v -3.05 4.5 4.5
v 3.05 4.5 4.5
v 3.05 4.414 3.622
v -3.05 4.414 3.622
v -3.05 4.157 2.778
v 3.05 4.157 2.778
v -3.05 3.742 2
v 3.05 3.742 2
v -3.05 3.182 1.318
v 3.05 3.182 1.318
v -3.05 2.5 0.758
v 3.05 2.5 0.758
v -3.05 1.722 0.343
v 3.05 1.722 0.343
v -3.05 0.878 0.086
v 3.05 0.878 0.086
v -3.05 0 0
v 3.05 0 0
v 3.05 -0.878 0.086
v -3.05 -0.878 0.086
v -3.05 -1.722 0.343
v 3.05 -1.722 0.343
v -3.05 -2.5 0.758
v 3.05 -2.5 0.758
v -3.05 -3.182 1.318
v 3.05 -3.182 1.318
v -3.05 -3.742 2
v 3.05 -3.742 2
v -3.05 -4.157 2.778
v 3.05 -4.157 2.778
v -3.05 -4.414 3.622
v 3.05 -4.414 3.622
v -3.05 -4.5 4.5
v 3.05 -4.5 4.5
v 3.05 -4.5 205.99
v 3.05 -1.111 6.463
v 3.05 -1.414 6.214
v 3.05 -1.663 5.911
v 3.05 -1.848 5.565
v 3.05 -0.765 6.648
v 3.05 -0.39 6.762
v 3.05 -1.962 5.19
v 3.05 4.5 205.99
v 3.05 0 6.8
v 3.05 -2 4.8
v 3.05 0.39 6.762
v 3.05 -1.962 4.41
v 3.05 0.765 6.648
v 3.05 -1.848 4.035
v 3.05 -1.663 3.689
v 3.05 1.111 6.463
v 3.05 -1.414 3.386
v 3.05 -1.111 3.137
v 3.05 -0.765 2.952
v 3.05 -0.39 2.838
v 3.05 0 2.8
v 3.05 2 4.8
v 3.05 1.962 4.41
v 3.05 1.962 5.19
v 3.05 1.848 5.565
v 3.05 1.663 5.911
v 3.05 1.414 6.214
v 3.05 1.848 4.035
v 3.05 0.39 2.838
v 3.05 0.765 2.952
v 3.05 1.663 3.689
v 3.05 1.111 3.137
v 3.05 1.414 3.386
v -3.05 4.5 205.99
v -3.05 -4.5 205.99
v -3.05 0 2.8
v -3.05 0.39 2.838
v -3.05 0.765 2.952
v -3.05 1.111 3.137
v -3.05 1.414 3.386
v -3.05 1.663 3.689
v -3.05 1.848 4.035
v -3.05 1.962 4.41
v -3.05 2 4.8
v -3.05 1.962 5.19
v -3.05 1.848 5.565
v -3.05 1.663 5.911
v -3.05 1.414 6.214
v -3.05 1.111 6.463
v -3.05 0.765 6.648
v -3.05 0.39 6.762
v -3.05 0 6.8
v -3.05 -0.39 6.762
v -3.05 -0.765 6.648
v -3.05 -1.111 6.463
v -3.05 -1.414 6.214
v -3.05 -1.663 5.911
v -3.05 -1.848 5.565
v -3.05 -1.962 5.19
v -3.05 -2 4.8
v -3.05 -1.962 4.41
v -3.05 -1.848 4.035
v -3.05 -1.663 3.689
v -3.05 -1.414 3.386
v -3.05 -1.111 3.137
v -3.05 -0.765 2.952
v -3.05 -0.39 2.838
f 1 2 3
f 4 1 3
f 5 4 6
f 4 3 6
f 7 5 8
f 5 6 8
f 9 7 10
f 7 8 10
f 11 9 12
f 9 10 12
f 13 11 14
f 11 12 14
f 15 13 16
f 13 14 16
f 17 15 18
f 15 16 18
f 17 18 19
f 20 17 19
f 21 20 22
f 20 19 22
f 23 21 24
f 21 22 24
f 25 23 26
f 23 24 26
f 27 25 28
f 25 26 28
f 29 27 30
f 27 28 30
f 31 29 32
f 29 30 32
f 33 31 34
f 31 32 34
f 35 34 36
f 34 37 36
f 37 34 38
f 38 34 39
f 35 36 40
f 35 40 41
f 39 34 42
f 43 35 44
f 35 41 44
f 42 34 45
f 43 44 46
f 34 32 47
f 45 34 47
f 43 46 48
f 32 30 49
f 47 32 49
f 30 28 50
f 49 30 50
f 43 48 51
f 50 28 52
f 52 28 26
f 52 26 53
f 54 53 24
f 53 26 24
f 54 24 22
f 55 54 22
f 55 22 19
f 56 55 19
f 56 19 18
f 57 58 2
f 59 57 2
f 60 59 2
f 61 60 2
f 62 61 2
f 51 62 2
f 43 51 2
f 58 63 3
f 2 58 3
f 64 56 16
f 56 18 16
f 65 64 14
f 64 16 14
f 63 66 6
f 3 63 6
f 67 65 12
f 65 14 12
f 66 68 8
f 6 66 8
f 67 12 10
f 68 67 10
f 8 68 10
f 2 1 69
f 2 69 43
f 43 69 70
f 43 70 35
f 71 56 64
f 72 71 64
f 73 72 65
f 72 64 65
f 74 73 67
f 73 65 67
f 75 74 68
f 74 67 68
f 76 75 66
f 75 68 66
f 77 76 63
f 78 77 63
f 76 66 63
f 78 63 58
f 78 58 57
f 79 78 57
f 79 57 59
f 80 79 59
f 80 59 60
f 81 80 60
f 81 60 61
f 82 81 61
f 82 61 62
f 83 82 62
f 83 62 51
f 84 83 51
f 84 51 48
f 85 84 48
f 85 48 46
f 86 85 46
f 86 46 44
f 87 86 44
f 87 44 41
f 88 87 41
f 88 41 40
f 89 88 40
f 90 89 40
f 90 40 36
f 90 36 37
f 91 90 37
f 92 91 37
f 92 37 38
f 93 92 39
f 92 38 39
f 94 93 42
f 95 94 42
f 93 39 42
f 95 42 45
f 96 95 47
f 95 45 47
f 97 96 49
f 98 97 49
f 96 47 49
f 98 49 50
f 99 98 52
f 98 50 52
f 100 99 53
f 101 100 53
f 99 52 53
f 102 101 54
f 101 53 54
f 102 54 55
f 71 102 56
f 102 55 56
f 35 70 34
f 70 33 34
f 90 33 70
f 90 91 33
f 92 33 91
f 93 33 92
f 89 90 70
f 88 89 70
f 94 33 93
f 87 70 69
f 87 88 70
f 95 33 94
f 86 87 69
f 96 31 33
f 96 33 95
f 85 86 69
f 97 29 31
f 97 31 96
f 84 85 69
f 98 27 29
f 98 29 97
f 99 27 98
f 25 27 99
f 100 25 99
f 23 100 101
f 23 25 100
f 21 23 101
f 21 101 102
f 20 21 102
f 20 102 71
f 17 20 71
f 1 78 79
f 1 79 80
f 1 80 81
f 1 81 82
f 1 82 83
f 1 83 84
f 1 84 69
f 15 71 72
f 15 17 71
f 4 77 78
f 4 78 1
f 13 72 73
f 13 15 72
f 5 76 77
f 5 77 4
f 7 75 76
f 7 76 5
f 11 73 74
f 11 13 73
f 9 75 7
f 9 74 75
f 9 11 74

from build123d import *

# Parameters (mm, degrees)
SKETCH1_W           = 6.1
SKETCH1_H           = 9
BOSS_EXTRUDE1_DEPTH = 9.29
SKETCH3_R           = 2
CUT_EXTRUDE2_DEPTH  = 12.990166805
SKETCH4_W           = 6.1
SKETCH4_H           = 9
BOSS_EXTRUDE2_DEPTH = 196.7


with BuildPart() as part:
    # Sketch1 → Boss-Extrude1 (new body)
    with BuildSketch(Plane.XY):
        Rectangle(SKETCH1_W, SKETCH1_H)
    extrude(amount=BOSS_EXTRUDE1_DEPTH)

    # Sketch3 → Cut-Extrude2 (cut, through all)
    with BuildSketch(Plane(origin=(3.05, 0, 0), x_dir=(0, 0, -1), z_dir=(1, 0, 0))):
        with BuildLine():
            ThreePointArc((-4.5, 4.5), (-1.318019485, 3.181980515), (0, 0))
            Line((0, 0), (0, 4.5))
            Line((0, 4.5), (-4.5, 4.5))
        make_face()
        with BuildLine():
            ThreePointArc((0, 0), (-1.318019485, -3.181980515), (-4.5, -4.5))
            Line((-4.5, -4.5), (0, -4.5))
            Line((0, -4.5), (0, 0))
        make_face()
        with Locations((-4.8, 0)):
            Circle(SKETCH3_R)
    extrude(amount=-CUT_EXTRUDE2_DEPTH, mode=Mode.SUBTRACT)

    # Sketch4 → Boss-Extrude2 (add)
    with BuildSketch(Plane.XY.offset(9.29)):
        Rectangle(SKETCH4_W, SKETCH4_H)
    extrude(amount=BOSS_EXTRUDE2_DEPTH)


solid = part.part
